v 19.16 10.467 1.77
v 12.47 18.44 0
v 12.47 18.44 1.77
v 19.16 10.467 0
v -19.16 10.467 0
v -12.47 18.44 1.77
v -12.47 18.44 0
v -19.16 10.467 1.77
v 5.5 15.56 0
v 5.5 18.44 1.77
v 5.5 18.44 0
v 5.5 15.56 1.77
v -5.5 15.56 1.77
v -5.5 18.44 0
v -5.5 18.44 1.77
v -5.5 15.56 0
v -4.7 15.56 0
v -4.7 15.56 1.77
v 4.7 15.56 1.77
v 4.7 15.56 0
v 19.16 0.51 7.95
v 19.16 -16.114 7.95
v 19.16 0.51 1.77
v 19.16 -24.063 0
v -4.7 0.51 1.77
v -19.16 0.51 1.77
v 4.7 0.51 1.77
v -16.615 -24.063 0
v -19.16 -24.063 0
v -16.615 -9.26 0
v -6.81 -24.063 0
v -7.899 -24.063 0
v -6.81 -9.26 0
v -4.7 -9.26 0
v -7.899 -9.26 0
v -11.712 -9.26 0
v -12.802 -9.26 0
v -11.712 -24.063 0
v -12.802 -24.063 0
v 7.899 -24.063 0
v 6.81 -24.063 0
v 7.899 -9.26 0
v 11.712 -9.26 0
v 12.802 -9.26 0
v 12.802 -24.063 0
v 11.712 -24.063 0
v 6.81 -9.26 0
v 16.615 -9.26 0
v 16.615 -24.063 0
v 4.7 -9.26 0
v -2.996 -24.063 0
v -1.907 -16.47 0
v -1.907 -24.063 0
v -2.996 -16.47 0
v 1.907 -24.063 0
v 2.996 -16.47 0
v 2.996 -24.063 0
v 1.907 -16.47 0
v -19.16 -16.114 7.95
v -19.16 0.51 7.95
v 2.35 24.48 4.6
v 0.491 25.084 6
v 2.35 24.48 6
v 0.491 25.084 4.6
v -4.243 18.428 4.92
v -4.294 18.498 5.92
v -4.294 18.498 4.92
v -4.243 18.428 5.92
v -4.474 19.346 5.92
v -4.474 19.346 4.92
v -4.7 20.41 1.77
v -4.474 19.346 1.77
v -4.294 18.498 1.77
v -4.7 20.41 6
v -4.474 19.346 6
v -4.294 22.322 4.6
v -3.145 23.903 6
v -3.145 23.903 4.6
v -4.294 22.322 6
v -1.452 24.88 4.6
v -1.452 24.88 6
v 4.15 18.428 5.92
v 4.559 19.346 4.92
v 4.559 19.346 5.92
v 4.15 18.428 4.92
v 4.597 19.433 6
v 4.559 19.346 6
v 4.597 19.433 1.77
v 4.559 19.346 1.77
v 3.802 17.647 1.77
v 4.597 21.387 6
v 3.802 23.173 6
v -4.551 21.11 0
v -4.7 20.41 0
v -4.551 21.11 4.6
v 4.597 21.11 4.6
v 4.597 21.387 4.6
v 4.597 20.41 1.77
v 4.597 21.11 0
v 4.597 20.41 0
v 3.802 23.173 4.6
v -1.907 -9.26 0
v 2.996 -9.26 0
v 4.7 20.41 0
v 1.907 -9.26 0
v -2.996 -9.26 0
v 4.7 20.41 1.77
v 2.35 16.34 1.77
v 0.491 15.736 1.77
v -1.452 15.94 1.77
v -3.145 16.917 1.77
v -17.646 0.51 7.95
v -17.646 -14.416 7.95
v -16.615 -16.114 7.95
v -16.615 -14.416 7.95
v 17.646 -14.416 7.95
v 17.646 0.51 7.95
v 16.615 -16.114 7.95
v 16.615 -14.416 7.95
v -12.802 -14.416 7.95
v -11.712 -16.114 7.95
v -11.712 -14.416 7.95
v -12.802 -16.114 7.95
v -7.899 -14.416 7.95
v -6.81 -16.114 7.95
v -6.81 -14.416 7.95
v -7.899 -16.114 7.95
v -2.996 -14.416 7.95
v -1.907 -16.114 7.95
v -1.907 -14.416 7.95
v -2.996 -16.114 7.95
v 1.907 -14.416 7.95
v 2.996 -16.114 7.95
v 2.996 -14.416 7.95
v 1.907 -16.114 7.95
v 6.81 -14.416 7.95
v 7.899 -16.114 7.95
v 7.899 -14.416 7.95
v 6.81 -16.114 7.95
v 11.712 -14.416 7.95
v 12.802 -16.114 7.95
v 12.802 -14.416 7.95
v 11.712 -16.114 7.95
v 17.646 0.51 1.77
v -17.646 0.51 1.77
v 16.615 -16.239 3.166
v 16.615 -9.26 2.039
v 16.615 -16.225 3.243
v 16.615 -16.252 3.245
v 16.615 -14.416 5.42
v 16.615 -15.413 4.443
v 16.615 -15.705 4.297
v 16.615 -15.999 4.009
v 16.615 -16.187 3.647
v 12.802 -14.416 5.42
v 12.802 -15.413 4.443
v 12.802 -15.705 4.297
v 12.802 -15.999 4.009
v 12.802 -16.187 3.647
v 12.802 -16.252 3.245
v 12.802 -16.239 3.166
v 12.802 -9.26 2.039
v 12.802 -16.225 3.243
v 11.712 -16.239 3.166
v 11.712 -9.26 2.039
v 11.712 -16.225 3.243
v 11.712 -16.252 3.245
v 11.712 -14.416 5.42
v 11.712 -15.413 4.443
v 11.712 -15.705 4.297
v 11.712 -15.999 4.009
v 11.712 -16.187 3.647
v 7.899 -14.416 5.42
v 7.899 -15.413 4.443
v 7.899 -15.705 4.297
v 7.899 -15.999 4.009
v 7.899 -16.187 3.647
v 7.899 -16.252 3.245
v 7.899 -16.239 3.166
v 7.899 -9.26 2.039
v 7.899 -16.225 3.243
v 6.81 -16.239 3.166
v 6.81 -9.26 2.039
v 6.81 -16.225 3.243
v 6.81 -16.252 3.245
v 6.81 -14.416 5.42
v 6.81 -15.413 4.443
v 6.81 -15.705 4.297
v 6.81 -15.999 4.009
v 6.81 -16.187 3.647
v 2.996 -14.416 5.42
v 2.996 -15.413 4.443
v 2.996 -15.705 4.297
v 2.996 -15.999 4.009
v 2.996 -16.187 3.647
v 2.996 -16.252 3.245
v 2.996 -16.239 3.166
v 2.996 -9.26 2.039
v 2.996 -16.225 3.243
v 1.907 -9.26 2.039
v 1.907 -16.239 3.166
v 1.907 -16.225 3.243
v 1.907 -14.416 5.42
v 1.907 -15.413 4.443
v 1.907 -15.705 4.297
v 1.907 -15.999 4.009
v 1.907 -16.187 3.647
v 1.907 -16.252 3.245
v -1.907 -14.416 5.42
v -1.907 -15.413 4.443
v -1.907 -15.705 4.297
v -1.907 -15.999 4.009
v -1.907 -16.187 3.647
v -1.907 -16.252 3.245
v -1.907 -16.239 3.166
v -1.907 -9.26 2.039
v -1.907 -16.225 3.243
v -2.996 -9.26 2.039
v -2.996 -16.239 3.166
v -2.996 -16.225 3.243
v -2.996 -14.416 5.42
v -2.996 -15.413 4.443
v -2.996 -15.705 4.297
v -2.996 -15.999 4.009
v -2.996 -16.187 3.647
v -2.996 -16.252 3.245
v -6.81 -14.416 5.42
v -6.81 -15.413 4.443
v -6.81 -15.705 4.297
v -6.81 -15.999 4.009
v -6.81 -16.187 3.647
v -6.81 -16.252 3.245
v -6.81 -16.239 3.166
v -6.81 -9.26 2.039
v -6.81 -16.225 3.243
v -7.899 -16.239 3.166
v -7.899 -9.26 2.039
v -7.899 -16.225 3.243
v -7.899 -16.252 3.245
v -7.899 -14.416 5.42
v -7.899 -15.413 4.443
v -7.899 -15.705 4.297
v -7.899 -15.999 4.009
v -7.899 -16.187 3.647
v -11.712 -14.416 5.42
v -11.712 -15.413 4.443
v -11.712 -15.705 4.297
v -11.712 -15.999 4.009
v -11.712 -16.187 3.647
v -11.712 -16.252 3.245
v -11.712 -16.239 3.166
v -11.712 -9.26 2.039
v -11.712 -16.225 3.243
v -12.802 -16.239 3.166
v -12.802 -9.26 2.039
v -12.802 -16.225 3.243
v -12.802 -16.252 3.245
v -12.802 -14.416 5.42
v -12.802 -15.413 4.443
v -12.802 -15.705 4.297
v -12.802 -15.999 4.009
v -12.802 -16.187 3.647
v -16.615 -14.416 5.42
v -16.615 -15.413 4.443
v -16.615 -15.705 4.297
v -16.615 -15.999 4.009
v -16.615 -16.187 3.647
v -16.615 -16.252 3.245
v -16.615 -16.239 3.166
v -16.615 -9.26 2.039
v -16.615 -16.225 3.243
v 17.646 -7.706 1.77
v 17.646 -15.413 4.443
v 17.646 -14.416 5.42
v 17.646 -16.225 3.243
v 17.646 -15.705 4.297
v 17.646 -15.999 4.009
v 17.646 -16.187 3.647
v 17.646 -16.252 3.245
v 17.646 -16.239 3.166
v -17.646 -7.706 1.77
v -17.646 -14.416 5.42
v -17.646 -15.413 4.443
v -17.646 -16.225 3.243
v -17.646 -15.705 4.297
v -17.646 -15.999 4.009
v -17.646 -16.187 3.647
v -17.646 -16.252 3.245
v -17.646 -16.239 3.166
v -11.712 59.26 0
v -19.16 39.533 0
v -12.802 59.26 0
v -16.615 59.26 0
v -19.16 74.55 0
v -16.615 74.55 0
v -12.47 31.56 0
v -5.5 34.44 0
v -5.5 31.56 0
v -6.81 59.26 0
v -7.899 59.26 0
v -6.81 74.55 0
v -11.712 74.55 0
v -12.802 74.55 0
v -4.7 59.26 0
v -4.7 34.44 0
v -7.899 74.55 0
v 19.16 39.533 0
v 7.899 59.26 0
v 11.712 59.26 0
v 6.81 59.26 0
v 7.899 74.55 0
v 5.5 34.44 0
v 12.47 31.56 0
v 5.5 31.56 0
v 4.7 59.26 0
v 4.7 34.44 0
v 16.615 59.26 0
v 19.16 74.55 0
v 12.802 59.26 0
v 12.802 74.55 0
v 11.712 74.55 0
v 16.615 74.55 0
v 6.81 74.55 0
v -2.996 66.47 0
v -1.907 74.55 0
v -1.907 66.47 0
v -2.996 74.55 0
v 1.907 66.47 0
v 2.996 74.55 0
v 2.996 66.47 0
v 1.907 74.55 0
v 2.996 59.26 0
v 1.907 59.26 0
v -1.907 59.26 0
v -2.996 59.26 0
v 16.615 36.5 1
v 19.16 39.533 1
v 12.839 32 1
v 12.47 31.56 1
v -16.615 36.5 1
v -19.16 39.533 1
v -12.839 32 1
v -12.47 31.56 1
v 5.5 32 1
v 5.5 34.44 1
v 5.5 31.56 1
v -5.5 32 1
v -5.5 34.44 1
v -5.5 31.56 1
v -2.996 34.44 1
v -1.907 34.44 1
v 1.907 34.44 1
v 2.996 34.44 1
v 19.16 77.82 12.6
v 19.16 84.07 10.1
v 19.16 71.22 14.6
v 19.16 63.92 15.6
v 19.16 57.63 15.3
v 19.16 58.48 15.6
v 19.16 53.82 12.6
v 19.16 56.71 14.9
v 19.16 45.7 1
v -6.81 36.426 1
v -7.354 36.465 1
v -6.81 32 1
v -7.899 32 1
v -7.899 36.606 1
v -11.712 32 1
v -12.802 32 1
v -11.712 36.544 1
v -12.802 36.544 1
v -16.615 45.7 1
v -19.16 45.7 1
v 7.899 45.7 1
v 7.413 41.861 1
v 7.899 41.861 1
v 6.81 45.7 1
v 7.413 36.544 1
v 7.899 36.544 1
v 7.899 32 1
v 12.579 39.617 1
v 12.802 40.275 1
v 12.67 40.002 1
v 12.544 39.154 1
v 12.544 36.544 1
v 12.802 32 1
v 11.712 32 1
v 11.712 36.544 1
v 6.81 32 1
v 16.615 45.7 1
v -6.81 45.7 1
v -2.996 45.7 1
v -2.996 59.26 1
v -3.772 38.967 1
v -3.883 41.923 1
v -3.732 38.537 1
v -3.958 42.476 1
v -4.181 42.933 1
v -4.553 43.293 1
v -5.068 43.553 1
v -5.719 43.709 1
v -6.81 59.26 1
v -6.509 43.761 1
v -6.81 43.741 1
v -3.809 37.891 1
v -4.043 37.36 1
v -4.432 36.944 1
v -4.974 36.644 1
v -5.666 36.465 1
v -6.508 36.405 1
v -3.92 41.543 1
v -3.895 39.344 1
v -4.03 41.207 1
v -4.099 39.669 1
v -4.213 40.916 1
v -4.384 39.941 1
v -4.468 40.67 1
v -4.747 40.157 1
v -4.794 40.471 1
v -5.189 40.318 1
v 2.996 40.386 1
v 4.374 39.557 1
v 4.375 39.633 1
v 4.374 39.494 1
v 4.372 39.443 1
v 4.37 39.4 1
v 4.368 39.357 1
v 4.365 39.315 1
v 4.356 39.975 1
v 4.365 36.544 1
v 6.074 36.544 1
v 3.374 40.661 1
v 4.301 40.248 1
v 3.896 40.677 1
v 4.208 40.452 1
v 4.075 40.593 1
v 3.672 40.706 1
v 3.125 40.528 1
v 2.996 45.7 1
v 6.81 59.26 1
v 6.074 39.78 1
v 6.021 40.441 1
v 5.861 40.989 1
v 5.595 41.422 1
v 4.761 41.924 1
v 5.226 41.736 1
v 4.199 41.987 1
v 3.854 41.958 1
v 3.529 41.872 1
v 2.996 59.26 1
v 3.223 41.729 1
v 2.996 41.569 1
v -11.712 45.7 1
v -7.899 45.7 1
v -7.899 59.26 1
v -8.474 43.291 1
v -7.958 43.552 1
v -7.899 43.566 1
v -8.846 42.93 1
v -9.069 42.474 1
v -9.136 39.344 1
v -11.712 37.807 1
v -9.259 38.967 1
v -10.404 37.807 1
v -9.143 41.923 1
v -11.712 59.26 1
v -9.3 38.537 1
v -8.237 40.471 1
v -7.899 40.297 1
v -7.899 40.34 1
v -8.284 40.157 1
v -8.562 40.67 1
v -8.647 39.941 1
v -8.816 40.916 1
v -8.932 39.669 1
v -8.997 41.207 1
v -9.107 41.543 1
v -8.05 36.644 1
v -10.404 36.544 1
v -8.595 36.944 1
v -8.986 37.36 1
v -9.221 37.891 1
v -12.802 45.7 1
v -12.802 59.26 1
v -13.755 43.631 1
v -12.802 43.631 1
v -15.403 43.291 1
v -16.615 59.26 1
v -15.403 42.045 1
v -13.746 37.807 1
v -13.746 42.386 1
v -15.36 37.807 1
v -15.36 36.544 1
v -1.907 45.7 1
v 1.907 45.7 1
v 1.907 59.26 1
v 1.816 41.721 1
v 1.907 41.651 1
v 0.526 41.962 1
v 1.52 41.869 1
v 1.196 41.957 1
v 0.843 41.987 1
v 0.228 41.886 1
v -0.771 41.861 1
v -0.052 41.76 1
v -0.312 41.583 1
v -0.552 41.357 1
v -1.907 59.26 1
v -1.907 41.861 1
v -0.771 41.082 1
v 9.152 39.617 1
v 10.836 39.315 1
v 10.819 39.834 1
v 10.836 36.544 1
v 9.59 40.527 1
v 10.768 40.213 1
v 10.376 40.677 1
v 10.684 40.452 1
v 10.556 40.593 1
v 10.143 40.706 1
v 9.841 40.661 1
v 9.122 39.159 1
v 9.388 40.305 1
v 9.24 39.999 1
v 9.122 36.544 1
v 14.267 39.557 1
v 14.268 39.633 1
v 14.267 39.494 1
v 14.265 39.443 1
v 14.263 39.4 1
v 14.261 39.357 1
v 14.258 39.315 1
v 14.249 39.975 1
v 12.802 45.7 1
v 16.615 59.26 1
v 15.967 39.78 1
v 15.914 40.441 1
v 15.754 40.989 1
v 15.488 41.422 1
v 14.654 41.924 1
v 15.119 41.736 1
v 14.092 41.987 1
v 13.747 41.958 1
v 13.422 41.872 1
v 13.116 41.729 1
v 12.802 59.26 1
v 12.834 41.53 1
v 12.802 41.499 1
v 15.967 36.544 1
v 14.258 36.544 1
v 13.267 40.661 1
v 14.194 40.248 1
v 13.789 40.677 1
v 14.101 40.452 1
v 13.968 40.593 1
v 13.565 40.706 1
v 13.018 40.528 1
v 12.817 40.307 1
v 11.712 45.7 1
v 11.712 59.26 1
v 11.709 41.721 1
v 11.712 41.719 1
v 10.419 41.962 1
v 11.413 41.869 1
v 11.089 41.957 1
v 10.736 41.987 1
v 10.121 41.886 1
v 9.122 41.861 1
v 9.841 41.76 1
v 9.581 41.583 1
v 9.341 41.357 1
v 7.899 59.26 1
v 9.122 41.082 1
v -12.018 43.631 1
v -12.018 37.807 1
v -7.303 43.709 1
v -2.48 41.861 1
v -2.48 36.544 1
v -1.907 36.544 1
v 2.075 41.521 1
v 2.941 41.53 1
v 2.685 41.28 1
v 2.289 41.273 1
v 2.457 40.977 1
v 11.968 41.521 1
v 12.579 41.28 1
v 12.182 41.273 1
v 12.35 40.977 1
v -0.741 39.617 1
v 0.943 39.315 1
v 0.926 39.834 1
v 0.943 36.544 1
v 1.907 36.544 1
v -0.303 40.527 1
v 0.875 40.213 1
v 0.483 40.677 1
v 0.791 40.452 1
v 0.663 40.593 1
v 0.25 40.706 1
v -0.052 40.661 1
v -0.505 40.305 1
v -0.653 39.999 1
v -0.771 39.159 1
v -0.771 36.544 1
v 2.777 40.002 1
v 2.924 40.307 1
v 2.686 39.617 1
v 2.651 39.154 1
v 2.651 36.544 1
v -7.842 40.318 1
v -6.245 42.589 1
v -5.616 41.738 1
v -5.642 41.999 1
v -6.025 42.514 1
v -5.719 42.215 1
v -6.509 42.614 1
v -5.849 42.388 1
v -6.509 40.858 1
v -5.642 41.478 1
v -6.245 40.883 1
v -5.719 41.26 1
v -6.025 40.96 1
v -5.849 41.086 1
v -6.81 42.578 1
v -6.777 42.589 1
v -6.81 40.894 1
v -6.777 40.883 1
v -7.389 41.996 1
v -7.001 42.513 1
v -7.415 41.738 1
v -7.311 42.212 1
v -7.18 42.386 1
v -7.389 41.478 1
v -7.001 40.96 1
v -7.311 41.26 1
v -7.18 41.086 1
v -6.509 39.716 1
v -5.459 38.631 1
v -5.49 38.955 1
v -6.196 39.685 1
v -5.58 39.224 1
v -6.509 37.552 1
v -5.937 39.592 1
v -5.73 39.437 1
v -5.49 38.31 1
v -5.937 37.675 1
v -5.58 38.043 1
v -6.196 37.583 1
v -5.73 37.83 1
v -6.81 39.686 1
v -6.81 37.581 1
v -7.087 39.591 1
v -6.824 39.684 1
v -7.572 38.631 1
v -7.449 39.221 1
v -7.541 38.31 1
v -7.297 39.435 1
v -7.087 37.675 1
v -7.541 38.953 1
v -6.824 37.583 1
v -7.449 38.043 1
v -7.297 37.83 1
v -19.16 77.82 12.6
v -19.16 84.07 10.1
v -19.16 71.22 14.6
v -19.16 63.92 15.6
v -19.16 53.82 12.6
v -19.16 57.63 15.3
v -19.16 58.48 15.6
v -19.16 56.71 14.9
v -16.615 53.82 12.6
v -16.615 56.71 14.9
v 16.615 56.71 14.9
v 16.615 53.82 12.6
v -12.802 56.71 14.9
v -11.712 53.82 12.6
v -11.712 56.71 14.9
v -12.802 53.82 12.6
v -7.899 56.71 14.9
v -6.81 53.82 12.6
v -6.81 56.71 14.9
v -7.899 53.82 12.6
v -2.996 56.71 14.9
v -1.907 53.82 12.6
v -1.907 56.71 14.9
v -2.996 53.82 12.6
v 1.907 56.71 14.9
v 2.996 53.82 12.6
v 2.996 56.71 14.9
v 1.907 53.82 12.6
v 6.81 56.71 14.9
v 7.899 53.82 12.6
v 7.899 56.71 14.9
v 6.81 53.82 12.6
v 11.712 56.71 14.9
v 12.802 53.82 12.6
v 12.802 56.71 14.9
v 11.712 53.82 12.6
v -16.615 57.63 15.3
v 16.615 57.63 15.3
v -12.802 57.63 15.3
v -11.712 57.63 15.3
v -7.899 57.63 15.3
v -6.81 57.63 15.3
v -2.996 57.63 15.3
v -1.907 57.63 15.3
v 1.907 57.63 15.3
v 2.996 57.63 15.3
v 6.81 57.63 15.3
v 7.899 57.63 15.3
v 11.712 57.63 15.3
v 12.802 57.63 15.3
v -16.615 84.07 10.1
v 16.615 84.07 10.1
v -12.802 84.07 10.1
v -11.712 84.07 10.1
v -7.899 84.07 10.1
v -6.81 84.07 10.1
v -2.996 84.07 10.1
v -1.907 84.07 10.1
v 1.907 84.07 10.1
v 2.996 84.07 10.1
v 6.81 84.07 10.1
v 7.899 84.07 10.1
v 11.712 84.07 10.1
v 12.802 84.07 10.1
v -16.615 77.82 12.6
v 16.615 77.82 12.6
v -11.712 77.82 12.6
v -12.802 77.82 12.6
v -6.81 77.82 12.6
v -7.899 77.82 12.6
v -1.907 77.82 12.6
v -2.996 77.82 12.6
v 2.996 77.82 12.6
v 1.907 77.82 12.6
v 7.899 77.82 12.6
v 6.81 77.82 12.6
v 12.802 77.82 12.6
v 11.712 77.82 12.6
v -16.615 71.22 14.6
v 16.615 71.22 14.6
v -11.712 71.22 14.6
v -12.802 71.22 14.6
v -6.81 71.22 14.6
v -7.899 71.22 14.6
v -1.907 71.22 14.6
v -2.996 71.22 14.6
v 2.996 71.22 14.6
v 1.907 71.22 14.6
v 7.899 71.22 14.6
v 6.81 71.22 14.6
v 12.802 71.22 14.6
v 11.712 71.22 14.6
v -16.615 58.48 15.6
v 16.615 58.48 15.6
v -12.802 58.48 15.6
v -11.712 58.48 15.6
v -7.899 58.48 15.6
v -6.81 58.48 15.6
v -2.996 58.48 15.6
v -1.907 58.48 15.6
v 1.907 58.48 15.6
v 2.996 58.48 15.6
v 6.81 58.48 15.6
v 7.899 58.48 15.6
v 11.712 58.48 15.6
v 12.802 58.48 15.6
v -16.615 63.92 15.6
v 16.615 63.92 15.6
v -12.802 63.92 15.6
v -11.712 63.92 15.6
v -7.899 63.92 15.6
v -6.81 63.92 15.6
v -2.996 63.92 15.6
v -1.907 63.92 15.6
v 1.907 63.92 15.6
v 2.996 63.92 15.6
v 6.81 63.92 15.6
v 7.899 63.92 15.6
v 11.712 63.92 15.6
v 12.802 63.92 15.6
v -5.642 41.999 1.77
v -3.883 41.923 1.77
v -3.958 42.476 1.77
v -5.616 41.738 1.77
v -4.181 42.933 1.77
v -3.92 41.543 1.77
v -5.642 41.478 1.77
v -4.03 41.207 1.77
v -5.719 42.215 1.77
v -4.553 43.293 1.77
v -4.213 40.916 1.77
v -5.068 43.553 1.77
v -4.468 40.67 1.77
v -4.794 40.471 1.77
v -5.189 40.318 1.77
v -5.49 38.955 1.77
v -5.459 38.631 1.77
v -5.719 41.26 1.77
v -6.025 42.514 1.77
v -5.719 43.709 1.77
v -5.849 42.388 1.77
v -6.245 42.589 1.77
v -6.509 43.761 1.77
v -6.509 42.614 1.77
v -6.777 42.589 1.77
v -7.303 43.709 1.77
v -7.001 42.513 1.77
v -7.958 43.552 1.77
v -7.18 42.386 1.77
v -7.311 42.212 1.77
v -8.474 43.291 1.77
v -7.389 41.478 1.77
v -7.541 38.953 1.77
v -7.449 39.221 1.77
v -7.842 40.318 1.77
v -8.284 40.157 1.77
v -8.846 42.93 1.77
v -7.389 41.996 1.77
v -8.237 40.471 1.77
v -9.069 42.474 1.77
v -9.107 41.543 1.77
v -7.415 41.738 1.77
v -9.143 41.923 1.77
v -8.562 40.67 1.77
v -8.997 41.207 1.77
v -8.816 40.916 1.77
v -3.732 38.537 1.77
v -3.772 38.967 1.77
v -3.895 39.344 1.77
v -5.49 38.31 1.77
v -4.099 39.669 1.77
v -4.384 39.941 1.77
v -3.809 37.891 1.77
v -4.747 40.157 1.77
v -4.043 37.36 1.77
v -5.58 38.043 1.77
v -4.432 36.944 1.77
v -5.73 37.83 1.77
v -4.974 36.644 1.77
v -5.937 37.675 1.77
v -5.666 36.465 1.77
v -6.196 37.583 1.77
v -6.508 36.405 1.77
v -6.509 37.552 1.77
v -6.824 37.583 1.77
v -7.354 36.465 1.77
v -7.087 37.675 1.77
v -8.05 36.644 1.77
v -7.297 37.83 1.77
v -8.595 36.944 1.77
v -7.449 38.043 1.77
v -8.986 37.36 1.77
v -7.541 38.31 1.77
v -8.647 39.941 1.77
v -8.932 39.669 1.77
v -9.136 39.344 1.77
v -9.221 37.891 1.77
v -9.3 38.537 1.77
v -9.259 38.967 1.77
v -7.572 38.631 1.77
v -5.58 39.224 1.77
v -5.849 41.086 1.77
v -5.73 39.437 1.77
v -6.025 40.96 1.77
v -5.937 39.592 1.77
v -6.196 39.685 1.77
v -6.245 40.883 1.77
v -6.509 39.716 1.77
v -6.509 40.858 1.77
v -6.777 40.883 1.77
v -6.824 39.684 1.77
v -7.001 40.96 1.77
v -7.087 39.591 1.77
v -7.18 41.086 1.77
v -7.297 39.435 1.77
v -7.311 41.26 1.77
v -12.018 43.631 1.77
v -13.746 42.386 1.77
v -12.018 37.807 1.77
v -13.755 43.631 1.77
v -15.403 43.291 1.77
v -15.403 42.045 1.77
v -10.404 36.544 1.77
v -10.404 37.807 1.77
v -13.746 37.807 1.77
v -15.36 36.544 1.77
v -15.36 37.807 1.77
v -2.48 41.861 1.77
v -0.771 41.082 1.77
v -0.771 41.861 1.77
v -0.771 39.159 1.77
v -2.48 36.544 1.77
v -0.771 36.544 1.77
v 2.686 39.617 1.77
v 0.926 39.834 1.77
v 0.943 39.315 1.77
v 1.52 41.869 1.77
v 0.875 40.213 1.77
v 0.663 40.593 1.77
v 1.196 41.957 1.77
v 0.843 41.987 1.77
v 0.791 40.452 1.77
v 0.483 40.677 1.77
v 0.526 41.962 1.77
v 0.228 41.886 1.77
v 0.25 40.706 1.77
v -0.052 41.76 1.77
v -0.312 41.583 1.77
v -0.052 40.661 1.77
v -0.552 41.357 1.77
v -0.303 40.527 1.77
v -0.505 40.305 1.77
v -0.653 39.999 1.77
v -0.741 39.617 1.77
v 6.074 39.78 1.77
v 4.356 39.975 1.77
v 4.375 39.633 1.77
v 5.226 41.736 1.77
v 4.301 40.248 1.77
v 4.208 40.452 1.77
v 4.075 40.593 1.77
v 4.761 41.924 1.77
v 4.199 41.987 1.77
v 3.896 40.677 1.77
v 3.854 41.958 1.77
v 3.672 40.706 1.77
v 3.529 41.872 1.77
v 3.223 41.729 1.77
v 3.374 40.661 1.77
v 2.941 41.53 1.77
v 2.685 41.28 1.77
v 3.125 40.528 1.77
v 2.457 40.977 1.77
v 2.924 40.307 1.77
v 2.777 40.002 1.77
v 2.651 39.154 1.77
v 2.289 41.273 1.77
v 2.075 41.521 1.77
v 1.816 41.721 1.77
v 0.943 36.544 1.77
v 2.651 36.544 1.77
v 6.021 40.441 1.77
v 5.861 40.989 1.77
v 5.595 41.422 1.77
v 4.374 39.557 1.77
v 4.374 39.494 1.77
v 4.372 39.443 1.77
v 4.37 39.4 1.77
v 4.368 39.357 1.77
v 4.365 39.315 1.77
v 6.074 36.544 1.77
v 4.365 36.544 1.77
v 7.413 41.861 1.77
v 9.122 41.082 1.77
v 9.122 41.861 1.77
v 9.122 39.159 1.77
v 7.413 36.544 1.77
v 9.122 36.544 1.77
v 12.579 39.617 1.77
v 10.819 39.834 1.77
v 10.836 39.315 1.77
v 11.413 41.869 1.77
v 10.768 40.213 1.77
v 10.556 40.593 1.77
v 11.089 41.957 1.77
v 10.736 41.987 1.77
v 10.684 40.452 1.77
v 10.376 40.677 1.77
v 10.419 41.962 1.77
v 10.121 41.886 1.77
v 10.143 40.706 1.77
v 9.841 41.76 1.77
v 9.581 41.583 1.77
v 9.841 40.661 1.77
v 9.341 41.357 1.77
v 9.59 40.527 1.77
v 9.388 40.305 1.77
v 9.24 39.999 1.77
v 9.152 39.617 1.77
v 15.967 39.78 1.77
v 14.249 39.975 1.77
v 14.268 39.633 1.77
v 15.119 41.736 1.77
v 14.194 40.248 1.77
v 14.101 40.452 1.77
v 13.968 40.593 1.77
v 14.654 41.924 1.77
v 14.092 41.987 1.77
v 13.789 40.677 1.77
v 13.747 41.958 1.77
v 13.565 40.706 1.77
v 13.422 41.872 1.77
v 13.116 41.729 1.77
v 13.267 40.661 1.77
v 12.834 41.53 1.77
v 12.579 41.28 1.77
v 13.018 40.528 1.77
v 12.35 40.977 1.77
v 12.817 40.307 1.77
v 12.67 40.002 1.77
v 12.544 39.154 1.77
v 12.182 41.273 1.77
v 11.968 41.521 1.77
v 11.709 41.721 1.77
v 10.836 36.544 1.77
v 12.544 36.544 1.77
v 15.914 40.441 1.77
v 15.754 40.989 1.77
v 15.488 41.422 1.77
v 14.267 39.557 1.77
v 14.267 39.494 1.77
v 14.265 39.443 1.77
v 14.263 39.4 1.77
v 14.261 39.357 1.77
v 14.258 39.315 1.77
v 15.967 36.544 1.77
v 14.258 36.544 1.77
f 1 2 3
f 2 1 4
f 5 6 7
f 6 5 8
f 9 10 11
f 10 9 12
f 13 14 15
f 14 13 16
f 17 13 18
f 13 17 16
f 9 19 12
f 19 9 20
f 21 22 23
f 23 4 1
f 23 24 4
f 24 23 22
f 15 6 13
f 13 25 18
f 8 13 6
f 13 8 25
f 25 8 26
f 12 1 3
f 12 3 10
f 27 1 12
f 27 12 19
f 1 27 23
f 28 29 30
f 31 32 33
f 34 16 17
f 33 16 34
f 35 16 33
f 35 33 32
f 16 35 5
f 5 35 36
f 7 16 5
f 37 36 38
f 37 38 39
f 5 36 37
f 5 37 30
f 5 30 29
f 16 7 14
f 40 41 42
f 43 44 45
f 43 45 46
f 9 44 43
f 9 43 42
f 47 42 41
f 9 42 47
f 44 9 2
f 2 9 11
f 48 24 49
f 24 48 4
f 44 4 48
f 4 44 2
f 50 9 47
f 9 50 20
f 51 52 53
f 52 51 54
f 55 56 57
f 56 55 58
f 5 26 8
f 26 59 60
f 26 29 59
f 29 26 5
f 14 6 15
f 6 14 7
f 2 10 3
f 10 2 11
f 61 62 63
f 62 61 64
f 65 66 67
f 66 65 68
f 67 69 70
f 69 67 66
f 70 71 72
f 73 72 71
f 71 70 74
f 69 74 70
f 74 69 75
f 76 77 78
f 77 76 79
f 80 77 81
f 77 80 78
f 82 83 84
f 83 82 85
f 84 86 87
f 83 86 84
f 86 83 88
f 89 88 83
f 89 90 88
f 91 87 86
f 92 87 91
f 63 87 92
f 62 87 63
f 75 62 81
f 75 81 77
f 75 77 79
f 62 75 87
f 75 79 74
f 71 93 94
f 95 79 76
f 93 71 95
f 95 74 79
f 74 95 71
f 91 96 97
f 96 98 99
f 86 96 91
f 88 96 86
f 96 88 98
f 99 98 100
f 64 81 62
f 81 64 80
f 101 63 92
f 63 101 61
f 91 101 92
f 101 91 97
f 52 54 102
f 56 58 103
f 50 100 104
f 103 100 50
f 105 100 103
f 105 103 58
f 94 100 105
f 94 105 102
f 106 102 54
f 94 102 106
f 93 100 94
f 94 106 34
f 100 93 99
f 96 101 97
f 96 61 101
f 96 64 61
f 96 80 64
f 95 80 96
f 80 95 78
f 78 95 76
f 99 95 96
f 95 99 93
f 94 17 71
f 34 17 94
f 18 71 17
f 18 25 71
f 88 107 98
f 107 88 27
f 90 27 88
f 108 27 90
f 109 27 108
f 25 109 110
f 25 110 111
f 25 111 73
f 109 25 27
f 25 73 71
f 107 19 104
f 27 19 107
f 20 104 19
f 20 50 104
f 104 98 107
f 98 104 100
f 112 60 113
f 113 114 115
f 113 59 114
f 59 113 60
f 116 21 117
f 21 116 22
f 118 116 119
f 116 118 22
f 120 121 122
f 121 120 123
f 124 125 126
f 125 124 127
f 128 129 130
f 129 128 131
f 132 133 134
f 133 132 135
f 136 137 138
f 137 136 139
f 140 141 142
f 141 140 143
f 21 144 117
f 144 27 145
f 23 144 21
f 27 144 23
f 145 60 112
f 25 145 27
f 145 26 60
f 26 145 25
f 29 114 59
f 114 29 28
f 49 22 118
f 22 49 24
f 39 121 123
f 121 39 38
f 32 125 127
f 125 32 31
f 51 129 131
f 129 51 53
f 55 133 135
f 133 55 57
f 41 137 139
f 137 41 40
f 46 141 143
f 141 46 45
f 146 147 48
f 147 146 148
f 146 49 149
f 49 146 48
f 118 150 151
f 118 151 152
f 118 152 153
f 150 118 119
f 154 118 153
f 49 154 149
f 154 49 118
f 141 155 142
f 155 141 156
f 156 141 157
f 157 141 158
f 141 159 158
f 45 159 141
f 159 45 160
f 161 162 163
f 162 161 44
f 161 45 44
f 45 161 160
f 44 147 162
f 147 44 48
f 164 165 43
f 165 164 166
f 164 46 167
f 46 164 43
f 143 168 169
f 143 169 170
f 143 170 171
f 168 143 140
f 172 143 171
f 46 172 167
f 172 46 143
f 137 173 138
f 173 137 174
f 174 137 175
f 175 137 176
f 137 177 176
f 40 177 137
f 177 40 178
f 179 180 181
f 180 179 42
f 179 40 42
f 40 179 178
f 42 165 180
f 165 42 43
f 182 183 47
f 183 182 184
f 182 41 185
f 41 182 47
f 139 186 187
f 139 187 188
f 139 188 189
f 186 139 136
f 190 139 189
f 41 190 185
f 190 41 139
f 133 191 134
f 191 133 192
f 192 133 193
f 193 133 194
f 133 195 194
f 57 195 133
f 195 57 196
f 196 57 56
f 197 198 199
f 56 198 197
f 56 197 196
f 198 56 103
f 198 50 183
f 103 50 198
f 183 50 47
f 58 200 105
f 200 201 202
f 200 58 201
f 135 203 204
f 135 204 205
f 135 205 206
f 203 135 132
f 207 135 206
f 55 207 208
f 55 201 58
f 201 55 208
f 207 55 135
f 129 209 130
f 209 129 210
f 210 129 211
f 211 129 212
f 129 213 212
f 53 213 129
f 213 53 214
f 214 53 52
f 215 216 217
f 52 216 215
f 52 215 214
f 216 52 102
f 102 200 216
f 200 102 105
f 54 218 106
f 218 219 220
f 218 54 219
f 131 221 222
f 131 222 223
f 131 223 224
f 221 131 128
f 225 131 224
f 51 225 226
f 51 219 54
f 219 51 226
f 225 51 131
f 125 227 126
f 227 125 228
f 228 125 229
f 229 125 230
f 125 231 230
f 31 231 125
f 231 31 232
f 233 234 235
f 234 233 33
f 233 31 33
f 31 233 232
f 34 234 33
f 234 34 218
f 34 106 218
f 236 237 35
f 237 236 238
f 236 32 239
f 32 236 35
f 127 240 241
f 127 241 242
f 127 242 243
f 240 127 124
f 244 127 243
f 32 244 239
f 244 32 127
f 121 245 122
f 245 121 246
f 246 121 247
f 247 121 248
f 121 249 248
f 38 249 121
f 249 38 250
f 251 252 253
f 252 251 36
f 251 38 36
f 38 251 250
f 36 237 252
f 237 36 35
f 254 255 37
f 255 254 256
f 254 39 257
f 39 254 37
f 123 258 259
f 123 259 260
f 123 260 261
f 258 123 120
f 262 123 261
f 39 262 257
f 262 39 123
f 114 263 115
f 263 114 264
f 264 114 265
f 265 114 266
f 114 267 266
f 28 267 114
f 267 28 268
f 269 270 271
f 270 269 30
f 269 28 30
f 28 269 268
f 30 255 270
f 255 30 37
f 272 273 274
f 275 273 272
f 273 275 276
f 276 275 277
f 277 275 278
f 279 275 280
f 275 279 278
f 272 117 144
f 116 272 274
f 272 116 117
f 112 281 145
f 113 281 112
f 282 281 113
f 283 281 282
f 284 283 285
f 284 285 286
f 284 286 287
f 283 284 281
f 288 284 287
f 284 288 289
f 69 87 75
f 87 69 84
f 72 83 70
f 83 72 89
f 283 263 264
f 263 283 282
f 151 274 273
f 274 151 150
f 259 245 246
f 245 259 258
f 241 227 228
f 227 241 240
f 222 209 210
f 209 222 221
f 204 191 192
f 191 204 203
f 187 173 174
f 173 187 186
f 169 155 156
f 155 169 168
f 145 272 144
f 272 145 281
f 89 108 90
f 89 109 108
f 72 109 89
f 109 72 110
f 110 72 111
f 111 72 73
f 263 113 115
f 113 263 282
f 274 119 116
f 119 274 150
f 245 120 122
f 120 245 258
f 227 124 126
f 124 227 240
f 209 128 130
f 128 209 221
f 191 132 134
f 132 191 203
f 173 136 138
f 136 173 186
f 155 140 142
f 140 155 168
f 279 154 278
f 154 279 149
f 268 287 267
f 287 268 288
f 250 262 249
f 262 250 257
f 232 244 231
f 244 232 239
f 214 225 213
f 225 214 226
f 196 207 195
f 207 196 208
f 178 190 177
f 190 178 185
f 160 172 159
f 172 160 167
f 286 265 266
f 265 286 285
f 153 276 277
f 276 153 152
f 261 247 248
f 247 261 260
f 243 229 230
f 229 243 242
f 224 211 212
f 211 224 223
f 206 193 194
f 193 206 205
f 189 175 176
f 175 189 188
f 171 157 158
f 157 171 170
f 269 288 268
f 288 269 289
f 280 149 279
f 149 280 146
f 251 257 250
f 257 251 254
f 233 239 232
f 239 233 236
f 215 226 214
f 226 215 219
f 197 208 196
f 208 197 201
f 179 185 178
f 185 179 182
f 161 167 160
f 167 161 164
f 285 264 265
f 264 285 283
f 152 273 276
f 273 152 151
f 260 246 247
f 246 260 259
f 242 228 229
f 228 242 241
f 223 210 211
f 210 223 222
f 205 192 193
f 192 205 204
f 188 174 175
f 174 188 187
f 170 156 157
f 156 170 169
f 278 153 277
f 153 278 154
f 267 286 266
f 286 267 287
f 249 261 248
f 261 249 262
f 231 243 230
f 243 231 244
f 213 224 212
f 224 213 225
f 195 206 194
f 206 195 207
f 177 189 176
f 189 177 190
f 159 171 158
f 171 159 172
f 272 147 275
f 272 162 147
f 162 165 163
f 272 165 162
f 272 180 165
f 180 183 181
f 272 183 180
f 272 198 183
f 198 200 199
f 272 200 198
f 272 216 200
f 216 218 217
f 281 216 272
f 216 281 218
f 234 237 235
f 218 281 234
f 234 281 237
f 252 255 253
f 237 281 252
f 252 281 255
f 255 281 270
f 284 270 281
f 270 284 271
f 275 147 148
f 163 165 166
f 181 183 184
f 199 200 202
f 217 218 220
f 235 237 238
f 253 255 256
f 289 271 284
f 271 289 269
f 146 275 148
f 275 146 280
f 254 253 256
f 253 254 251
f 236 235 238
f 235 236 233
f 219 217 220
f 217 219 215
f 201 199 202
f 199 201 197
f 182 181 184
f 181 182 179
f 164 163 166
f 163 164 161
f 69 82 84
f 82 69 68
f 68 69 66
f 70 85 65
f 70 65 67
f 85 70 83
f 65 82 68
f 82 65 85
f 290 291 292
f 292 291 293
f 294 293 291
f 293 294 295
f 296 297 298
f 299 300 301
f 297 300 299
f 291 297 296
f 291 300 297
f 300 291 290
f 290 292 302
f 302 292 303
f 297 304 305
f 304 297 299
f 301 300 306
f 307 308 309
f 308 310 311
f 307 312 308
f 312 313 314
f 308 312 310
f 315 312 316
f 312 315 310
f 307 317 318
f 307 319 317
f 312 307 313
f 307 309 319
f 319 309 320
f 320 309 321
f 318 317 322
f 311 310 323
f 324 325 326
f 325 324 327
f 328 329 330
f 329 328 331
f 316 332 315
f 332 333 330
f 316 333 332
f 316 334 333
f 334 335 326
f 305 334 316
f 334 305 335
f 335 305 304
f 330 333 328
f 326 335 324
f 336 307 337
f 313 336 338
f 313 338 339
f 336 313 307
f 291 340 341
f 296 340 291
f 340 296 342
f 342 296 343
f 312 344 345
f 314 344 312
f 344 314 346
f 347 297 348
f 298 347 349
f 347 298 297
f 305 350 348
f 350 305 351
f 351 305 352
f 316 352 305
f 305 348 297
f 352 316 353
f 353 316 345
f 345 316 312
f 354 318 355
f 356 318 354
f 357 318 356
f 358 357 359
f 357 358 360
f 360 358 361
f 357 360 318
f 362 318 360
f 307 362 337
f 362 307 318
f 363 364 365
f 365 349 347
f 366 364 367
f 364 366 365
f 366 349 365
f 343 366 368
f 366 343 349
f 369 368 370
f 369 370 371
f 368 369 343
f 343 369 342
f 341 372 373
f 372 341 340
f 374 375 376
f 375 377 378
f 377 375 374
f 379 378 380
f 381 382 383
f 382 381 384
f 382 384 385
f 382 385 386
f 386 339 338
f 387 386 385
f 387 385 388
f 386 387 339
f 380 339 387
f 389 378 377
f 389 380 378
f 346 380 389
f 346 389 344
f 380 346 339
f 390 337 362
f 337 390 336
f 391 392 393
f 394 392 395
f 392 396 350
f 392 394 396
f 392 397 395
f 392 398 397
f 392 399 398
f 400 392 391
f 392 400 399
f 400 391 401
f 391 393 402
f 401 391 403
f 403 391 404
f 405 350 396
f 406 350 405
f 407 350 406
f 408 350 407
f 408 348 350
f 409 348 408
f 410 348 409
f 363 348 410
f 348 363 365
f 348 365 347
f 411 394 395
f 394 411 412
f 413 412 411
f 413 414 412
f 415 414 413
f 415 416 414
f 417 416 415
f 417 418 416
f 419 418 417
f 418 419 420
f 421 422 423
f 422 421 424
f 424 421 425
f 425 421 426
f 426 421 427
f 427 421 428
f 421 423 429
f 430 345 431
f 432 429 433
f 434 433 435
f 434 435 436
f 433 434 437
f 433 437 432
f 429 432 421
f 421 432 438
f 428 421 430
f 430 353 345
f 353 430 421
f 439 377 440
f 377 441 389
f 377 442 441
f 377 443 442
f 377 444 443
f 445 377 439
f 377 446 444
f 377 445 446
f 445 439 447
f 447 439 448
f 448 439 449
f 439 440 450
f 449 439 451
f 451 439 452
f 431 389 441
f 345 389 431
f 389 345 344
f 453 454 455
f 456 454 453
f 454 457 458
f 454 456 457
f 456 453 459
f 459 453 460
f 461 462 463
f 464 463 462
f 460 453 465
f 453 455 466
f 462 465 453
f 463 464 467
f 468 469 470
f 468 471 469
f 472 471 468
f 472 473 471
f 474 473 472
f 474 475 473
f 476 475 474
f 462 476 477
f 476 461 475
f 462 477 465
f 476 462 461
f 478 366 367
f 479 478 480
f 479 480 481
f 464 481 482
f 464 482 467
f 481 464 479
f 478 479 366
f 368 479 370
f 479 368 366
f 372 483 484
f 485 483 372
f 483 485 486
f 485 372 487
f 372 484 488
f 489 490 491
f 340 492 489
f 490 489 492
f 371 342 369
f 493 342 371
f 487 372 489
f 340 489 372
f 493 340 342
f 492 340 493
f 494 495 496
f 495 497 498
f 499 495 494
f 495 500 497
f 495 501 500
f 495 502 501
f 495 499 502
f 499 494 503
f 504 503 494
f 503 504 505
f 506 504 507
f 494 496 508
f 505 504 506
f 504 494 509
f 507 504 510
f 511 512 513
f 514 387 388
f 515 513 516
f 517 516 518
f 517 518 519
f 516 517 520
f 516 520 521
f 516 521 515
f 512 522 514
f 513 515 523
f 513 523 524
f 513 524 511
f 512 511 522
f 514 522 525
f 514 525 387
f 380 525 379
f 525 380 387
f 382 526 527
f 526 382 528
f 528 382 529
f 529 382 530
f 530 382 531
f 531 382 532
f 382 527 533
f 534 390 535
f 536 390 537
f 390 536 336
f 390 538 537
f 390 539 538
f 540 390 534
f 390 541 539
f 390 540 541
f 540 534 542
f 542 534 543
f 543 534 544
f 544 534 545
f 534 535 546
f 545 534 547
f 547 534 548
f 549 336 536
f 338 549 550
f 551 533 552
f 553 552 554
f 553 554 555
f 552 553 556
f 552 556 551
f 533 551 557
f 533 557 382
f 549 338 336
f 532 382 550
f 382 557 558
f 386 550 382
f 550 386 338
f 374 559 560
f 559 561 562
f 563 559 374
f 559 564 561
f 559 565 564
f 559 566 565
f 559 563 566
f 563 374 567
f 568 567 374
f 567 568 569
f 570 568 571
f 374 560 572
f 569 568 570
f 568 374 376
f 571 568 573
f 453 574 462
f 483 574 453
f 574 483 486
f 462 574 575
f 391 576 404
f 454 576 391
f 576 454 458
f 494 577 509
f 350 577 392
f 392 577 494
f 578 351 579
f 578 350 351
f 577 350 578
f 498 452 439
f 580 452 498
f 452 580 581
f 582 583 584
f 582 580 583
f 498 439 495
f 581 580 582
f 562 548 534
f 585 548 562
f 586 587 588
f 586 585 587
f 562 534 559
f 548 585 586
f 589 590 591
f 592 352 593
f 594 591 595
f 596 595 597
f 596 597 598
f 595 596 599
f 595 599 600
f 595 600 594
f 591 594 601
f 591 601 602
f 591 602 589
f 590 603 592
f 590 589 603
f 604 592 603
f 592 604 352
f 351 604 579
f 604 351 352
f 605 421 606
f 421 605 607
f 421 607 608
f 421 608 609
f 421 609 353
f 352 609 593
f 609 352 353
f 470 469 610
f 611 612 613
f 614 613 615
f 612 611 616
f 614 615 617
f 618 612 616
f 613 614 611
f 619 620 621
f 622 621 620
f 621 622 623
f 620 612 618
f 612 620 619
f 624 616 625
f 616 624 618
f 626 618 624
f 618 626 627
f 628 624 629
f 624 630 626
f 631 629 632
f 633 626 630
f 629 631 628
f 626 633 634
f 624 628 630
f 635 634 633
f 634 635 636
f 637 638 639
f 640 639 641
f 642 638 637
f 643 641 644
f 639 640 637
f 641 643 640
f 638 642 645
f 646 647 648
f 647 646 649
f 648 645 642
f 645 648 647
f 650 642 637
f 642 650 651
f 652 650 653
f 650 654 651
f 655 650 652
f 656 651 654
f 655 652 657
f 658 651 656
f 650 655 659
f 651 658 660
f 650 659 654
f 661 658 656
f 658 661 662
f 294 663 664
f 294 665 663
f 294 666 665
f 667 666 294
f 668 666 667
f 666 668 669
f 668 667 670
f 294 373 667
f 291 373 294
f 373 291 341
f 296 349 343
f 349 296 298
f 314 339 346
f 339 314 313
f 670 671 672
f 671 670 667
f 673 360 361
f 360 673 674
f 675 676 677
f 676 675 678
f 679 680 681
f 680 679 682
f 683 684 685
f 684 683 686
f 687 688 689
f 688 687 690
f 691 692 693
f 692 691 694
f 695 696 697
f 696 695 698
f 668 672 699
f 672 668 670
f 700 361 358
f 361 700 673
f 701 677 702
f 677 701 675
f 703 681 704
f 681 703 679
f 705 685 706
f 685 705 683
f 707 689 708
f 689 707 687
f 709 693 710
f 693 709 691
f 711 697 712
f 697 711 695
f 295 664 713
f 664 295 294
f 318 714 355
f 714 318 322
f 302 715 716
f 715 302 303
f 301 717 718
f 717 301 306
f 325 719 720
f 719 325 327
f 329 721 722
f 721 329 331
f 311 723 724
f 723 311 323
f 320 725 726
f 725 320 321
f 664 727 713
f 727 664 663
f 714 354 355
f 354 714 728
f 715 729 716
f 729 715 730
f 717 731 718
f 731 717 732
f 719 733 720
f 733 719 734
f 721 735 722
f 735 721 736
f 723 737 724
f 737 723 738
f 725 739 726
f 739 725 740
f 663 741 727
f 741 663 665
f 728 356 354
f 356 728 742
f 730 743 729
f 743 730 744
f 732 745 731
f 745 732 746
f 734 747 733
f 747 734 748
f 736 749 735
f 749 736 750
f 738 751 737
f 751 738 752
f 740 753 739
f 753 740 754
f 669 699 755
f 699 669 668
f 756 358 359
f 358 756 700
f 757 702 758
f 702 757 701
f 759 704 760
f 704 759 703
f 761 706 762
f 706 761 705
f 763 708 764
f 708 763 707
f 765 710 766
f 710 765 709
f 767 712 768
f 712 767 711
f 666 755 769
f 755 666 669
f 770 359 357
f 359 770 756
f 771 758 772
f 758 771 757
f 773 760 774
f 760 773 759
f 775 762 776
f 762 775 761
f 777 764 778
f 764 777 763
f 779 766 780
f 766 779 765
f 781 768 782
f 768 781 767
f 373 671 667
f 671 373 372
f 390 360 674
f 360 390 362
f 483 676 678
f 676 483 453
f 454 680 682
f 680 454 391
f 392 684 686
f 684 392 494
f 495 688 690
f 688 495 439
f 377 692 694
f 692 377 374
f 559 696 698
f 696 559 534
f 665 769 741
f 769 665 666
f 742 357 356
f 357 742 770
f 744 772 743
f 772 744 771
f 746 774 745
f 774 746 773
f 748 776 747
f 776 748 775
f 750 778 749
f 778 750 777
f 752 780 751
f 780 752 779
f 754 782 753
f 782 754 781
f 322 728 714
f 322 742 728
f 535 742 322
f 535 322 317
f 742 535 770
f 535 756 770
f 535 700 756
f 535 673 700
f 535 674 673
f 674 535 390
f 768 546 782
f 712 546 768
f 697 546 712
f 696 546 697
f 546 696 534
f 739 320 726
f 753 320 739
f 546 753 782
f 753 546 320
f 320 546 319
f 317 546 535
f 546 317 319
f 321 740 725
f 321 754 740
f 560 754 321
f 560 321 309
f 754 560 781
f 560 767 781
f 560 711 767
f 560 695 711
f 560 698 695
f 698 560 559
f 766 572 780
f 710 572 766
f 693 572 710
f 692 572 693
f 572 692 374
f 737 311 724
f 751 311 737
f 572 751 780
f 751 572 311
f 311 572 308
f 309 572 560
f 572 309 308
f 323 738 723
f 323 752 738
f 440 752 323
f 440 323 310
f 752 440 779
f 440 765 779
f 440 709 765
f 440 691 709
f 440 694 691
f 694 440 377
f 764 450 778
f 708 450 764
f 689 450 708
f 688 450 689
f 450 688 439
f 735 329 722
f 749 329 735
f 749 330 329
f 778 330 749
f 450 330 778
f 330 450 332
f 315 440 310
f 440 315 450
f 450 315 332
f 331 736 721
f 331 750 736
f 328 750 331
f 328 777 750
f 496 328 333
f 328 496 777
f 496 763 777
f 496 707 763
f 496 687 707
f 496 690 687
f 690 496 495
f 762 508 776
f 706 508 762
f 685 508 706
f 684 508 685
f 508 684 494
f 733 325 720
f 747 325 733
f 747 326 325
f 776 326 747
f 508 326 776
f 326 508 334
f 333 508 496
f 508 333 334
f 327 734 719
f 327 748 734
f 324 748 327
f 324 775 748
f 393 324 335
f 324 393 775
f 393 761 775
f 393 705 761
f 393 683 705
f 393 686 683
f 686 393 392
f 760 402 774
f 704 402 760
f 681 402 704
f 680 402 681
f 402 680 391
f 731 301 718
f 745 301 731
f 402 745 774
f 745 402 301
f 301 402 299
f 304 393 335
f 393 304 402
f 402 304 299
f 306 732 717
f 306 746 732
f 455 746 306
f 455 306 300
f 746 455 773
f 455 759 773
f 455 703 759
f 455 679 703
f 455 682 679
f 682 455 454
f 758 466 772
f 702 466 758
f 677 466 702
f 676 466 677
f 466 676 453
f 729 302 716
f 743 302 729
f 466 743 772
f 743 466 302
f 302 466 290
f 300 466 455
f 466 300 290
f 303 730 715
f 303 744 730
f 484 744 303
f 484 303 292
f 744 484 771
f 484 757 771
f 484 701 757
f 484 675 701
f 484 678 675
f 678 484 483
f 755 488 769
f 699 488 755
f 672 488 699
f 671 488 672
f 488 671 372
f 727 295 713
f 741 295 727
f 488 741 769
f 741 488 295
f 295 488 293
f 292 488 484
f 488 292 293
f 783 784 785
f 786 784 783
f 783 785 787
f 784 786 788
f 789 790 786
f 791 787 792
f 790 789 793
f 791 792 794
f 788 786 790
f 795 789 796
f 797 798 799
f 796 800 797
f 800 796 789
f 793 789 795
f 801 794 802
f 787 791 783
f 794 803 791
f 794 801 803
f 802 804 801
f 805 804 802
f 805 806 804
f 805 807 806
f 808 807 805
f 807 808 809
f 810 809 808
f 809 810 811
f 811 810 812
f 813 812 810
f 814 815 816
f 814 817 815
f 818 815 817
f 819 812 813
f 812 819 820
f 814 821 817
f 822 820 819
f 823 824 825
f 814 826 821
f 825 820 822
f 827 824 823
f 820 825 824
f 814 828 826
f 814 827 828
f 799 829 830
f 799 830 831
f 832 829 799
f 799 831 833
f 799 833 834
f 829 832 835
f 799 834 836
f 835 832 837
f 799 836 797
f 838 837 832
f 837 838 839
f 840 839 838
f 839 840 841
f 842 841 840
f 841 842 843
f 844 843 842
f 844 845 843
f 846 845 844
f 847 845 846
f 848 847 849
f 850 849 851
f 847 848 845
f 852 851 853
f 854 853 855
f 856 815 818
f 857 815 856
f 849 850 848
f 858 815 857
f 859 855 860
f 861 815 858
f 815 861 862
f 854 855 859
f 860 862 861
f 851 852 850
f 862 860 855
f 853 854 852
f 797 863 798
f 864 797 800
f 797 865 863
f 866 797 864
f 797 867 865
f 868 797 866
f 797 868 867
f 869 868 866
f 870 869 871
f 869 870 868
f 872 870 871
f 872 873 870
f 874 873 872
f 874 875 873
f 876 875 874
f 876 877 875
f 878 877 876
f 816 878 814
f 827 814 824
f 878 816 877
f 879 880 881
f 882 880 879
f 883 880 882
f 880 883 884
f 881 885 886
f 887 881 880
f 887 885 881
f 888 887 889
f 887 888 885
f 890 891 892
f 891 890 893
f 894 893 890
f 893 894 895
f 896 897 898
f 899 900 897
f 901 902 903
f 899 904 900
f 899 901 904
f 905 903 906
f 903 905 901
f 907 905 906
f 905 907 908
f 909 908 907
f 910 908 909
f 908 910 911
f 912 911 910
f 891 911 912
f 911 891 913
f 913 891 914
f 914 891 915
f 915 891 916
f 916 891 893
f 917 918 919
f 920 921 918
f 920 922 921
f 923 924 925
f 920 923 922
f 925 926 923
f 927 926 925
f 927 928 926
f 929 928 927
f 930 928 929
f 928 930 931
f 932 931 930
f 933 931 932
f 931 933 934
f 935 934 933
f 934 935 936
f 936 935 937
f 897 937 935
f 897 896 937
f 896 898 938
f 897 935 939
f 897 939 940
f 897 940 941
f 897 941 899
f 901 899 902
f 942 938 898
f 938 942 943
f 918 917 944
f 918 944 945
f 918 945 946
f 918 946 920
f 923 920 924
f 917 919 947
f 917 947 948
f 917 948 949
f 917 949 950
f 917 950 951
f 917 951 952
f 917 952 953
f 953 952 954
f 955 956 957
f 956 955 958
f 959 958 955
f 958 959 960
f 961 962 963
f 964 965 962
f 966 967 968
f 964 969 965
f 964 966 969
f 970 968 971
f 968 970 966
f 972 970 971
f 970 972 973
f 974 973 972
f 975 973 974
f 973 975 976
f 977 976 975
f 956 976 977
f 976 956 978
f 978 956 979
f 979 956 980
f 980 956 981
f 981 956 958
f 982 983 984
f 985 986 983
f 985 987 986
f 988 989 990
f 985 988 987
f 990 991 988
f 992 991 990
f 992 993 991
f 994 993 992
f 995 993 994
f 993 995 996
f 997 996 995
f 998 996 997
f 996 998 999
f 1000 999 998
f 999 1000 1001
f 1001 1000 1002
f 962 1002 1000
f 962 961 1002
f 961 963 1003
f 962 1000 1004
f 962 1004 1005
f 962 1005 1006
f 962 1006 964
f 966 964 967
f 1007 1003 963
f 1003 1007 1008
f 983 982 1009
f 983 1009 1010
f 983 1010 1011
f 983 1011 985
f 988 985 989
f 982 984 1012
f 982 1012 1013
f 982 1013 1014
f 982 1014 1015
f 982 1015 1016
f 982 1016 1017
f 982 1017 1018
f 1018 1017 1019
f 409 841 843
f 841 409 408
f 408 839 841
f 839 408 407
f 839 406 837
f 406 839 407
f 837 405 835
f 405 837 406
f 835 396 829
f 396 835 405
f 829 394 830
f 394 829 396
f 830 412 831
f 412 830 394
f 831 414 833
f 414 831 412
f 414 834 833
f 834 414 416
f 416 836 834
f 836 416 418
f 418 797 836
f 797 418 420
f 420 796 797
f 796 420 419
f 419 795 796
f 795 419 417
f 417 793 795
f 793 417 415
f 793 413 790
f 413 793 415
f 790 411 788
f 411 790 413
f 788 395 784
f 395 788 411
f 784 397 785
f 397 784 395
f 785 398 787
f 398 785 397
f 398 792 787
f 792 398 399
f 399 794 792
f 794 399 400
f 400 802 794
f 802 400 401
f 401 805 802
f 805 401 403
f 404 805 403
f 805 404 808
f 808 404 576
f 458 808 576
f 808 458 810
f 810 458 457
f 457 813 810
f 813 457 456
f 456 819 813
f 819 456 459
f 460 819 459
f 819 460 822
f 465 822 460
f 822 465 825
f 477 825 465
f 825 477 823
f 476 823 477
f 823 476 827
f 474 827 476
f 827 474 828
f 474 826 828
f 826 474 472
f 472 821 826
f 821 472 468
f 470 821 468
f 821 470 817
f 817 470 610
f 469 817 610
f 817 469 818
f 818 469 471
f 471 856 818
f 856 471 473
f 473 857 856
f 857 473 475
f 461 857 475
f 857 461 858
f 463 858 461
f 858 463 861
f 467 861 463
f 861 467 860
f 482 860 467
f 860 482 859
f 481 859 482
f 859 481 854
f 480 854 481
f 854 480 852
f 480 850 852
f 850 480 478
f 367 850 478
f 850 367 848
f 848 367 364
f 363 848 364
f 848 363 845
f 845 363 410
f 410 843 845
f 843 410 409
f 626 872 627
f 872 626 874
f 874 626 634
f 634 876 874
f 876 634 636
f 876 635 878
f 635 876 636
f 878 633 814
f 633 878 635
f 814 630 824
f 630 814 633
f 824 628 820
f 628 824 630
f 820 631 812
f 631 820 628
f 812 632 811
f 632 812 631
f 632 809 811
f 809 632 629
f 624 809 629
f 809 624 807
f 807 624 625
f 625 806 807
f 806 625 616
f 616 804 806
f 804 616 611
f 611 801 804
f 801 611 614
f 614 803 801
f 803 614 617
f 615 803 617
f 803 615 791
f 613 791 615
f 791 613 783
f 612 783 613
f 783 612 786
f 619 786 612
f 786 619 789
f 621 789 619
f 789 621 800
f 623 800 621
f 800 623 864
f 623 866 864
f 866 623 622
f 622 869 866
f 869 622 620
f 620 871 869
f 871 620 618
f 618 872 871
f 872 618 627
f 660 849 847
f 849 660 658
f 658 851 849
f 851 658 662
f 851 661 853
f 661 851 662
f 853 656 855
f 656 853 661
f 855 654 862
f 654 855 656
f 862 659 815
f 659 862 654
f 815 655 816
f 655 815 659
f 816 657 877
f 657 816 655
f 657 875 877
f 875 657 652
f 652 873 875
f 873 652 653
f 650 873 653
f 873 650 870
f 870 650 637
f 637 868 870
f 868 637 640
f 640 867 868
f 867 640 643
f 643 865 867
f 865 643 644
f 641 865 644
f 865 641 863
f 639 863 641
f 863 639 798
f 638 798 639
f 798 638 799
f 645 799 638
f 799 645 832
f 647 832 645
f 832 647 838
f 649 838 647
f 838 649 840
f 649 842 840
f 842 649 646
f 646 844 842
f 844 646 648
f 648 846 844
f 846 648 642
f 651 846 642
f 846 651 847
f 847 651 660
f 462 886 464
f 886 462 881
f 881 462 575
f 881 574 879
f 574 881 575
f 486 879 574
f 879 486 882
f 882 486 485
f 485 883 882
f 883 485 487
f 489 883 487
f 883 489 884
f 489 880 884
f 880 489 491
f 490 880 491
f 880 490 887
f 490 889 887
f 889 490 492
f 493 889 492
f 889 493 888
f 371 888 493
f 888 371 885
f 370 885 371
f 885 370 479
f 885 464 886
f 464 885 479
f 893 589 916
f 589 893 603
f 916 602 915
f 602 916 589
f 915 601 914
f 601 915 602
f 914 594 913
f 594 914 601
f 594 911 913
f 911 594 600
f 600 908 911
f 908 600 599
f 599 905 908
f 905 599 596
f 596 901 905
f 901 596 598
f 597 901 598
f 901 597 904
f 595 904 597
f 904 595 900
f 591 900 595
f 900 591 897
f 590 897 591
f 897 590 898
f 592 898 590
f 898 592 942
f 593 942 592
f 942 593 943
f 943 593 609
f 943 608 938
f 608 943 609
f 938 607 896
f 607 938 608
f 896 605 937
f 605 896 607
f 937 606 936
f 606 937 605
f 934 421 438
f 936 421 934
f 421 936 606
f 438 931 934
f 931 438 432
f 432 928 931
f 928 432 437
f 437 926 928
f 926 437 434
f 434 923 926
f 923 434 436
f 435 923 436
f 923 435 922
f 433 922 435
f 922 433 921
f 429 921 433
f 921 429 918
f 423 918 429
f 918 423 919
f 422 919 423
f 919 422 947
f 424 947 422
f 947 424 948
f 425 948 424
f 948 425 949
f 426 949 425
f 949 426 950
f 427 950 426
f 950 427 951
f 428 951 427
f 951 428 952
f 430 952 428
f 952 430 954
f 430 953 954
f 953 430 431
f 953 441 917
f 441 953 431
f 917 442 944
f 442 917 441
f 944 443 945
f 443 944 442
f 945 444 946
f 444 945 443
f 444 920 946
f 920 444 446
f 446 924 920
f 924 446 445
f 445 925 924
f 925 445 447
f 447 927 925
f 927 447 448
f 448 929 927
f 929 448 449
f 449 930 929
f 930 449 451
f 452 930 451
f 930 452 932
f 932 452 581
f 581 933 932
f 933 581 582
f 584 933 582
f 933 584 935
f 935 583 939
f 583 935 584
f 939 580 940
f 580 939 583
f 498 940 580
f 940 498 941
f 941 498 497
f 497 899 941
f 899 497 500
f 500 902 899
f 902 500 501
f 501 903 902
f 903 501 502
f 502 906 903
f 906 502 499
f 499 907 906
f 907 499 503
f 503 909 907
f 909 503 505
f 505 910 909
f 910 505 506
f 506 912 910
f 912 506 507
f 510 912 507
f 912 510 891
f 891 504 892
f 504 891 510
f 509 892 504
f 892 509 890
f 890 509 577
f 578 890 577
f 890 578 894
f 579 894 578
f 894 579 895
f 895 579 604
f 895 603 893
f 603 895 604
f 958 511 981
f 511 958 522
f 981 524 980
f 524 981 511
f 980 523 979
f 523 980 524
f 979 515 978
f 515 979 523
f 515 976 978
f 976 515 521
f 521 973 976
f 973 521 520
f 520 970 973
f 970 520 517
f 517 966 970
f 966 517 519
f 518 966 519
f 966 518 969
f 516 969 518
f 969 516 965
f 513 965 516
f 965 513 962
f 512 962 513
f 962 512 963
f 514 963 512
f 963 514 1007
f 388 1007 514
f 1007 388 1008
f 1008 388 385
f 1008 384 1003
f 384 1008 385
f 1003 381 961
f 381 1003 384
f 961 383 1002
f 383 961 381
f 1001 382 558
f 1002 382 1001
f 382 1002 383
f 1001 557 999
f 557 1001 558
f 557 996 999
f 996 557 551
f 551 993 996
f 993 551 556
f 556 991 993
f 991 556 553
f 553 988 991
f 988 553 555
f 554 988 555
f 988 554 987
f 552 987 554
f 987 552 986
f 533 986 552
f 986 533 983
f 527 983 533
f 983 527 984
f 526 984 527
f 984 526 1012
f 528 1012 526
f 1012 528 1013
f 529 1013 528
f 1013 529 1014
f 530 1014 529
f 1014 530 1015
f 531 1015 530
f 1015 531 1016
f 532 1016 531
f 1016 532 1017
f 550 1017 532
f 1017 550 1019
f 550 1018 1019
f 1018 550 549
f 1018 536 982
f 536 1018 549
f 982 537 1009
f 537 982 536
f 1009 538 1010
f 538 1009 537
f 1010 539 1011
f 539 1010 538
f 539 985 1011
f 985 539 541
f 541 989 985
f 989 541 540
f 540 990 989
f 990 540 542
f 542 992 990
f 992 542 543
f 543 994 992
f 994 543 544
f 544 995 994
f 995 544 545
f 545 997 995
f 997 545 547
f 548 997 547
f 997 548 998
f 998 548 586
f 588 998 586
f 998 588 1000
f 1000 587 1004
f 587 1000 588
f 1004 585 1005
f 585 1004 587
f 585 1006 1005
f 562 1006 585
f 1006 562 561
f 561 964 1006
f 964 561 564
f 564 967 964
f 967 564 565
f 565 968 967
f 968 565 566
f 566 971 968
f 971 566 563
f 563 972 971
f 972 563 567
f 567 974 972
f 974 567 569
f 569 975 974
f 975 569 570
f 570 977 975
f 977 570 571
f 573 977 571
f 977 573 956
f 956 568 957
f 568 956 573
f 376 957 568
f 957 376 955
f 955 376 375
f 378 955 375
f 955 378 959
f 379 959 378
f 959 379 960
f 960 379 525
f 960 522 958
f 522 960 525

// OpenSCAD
// A parametric guard for the Trym beard trimmer. The largest guard it comes with is 9mm which is
// not enough mms. This lets to have as many mms as you desire.
//
// First OpenSCAD project. Kind of a mess.

// The length to cut the hair in millimeters (measure twice, cut once though)
guard_height = 18;

/* Hidden */

base_width = 38.32;
base_length = 27.70+9.18;
base_thickness = 1.77;

base_notch_width= 11;
base_notch_length = 2.88;

root_width = 26.95;
root_height = 7.95-1.77+base_thickness;

module base_chamfer(dir) {
  translate([dir * (base_width/2), base_length/2, 0])
    rotate(a=dir*40, v=[0,0,1])
    cube([10.25, 10.25*2, base_thickness*2], center=true);
}


// Trym Guard Base
module trym_guard_base() {
  module base_core() {

    difference() {
      cube([base_width, base_length, base_thickness], center=true);
      union() {
        base_chamfer(1);
        base_chamfer(-1);
        translate([0, base_length/2, 0])
          cube([base_notch_width, base_notch_length*2, base_thickness*2], center=true);
      }
    }
  }

  module lock_tab() {
    lock_tab_offset = 1.97;
    lock_tab_width = 9.4;
    riser_length = 1.4;
    riser_height = 6.0;
    latch_sides = 1.25;

    translate([lock_tab_width/2, base_length/2+lock_tab_offset, -base_thickness/2])
      rotate(a=180, v=[0, 0, 1]) {
        cube([lock_tab_width, base_length, base_thickness]);
        difference() {
          translate([lock_tab_width/2, 0, 0]) cylinder(h=riser_height, d=lock_tab_width);
          union() {
            //translate([0, riser_length, base_thickness])
            //  cube([lock_tab_width, lock_tab_width, riser_height*2]);
            translate([0, -lock_tab_width-0.7, 0])
              cube([lock_tab_width, lock_tab_width, riser_height-riser_length]);
          }
        }
      }
  }

  module teeth_guard() {
    difference() {
      translate([0, -base_length/2 + root_width/2 - 8, -base_thickness/2+root_height/2])
        cube([base_width, root_width, root_height], center=true);
      union() {
        translate([0, -base_length/2-2, base_thickness/2+root_height/2+3.5])
          rotate(a=45, v=[1, 0, 0])
          cube([base_width, root_width, root_height], center=true);
      }
    }
  }

  translate([0, 0, base_thickness/2]) {
    difference() {
      union() {
        base_core();
        lock_tab();
        teeth_guard();
      }
      union() {
        for(i=[0:6]) {
          tooth_area_width = base_width-4;
          translate([tooth_area_width/2 - tooth_area_width/7*i - tooth_area_width/7/2, -base_length/2, root_height/2-base_thickness/2]) 
            cube([tooth_area_width/9, 9.18*2, 50], center=true);
        }
      }
    }
  }
}

head_length = 34.6;
head_width = 34.6;
head_thickness = 2.65;
module trym_head() {
  difference() {
    union() {
      translate([0, 1.1/4, 0]) cube([head_width, head_length-1.1/2, head_thickness], center=true);
      difference() {
        translate([0, 0.25, head_thickness/2+1/2])
          cube([head_width, head_length-0.5, 1], center=true);
        translate([-head_width/2, -head_length/2+0.5, head_thickness/2])
          rotate(a=45, v=[1, 0, 0])
          cube([head_width, 3, 3]);
      }
      translate([0, 0.75, head_thickness/2+1+10]) cube([head_width, head_length-1.5, 20], center=true);
      translate([0, -head_length/2 + 1, 0.15]) rotate(a=90, v=[0, 1, 0]) cylinder(d=2.6, h=head_width, center=true, $fn=20);
    }
    union() {
      translate([0, -head_length/2-0.3, 0])
        rotate(a=-10, v=[1, 0, 0])
        translate([-head_width/2, 0, -head_thickness-0.2])
        cube([head_width, 8.47+0.4, 3]);
      notch_depth = 0.9;
      notch_width = 9.5;
      translate([0, head_width/2-notch_depth/2, head_thickness/2+1]) cube([notch_width, notch_depth, 1], center=true);
    }
  }
}

module trym_base() {
  difference() {
    trym_guard_base();
    translate([0, 1.7, base_thickness + head_thickness/2])
      scale([1.02, 1.02, 1]) // wiggle room on the sides
      trym_head();
  }
}

module trym_teeth(height) {
  adjusted_height=height-2.4;
  rotate(a=180, v=[1, 0, 0])
    difference() {
      union() {
        difference() {
          union() {
            guard_base_length = 32;
            translate([0,5,0])
              rotate(a=90, v=[0, 0, 1])
              rotate(a=90, v=[1, 0, 0]) 
              translate([0,0,-base_width/2])
              linear_extrude(height=base_width) {
                // The "0.7" is the skew value; pushed along the y axis
                M = [ [ 1, 0.7, 0],
                  [ 0, 1, 0],
                  [ 0, 0, 1] ] ;
                multmatrix(M)
                  polygon([[0,0],
                      [-guard_base_length+2.45,0],
                      [-guard_base_length,-adjusted_height+5.5],
                      [-guard_base_length*0.75,-adjusted_height+3],
                      [-guard_base_length*0.50,-adjusted_height+1],
                      [-guard_base_length*0.25,-adjusted_height],
                      [-guard_base_length*0.08,-adjusted_height],
                      [-guard_base_length*0.06,-adjusted_height+0.3],
                      [-guard_base_length*0.04,-adjusted_height+0.7],
                      [0,-adjusted_height+3]]);

              }
            translate([0, 0, -1/2]) {
              difference() {
                cube([base_width, base_length, 1], center=true);
                union() {
                  base_chamfer(1);
                  base_chamfer(-1);
                  translate([0, base_length/2, 0])
                    cube([base_notch_width, base_notch_length*2, base_thickness*2], center=true);
                }
              }
            }
          }
          union() {
            for(i=[0:6]) {
              tooth_area_width = base_width-4;
              translate([tooth_area_width/2 - tooth_area_width/7*i - tooth_area_width/7/2, -base_length/2 - (9.18*18/2), root_height/2-base_thickness/2]) 
                cube([tooth_area_width/9, 9.18*20, 100], center=true);
              translate([tooth_area_width/2 - tooth_area_width/7*i - tooth_area_width/7/2, 0, -height/2-1]) 
                cube([tooth_area_width/9, height*2, height], center=true);
            }
          }
        }
        // text
        rotate(a=180, v=[0, 1, 0])
          translate([0, 10, 0])
          linear_extrude(height=base_thickness)
          rotate(a=180, v=[0, 0, 1])
          text(text = str(height, "mm"), font="Impact:style=Bold", size=7, halign="center", valign="center");
      }
      trym_base();
    }
}

trym_base();
translate([0, 50, 0]) trym_teeth(guard_height);
